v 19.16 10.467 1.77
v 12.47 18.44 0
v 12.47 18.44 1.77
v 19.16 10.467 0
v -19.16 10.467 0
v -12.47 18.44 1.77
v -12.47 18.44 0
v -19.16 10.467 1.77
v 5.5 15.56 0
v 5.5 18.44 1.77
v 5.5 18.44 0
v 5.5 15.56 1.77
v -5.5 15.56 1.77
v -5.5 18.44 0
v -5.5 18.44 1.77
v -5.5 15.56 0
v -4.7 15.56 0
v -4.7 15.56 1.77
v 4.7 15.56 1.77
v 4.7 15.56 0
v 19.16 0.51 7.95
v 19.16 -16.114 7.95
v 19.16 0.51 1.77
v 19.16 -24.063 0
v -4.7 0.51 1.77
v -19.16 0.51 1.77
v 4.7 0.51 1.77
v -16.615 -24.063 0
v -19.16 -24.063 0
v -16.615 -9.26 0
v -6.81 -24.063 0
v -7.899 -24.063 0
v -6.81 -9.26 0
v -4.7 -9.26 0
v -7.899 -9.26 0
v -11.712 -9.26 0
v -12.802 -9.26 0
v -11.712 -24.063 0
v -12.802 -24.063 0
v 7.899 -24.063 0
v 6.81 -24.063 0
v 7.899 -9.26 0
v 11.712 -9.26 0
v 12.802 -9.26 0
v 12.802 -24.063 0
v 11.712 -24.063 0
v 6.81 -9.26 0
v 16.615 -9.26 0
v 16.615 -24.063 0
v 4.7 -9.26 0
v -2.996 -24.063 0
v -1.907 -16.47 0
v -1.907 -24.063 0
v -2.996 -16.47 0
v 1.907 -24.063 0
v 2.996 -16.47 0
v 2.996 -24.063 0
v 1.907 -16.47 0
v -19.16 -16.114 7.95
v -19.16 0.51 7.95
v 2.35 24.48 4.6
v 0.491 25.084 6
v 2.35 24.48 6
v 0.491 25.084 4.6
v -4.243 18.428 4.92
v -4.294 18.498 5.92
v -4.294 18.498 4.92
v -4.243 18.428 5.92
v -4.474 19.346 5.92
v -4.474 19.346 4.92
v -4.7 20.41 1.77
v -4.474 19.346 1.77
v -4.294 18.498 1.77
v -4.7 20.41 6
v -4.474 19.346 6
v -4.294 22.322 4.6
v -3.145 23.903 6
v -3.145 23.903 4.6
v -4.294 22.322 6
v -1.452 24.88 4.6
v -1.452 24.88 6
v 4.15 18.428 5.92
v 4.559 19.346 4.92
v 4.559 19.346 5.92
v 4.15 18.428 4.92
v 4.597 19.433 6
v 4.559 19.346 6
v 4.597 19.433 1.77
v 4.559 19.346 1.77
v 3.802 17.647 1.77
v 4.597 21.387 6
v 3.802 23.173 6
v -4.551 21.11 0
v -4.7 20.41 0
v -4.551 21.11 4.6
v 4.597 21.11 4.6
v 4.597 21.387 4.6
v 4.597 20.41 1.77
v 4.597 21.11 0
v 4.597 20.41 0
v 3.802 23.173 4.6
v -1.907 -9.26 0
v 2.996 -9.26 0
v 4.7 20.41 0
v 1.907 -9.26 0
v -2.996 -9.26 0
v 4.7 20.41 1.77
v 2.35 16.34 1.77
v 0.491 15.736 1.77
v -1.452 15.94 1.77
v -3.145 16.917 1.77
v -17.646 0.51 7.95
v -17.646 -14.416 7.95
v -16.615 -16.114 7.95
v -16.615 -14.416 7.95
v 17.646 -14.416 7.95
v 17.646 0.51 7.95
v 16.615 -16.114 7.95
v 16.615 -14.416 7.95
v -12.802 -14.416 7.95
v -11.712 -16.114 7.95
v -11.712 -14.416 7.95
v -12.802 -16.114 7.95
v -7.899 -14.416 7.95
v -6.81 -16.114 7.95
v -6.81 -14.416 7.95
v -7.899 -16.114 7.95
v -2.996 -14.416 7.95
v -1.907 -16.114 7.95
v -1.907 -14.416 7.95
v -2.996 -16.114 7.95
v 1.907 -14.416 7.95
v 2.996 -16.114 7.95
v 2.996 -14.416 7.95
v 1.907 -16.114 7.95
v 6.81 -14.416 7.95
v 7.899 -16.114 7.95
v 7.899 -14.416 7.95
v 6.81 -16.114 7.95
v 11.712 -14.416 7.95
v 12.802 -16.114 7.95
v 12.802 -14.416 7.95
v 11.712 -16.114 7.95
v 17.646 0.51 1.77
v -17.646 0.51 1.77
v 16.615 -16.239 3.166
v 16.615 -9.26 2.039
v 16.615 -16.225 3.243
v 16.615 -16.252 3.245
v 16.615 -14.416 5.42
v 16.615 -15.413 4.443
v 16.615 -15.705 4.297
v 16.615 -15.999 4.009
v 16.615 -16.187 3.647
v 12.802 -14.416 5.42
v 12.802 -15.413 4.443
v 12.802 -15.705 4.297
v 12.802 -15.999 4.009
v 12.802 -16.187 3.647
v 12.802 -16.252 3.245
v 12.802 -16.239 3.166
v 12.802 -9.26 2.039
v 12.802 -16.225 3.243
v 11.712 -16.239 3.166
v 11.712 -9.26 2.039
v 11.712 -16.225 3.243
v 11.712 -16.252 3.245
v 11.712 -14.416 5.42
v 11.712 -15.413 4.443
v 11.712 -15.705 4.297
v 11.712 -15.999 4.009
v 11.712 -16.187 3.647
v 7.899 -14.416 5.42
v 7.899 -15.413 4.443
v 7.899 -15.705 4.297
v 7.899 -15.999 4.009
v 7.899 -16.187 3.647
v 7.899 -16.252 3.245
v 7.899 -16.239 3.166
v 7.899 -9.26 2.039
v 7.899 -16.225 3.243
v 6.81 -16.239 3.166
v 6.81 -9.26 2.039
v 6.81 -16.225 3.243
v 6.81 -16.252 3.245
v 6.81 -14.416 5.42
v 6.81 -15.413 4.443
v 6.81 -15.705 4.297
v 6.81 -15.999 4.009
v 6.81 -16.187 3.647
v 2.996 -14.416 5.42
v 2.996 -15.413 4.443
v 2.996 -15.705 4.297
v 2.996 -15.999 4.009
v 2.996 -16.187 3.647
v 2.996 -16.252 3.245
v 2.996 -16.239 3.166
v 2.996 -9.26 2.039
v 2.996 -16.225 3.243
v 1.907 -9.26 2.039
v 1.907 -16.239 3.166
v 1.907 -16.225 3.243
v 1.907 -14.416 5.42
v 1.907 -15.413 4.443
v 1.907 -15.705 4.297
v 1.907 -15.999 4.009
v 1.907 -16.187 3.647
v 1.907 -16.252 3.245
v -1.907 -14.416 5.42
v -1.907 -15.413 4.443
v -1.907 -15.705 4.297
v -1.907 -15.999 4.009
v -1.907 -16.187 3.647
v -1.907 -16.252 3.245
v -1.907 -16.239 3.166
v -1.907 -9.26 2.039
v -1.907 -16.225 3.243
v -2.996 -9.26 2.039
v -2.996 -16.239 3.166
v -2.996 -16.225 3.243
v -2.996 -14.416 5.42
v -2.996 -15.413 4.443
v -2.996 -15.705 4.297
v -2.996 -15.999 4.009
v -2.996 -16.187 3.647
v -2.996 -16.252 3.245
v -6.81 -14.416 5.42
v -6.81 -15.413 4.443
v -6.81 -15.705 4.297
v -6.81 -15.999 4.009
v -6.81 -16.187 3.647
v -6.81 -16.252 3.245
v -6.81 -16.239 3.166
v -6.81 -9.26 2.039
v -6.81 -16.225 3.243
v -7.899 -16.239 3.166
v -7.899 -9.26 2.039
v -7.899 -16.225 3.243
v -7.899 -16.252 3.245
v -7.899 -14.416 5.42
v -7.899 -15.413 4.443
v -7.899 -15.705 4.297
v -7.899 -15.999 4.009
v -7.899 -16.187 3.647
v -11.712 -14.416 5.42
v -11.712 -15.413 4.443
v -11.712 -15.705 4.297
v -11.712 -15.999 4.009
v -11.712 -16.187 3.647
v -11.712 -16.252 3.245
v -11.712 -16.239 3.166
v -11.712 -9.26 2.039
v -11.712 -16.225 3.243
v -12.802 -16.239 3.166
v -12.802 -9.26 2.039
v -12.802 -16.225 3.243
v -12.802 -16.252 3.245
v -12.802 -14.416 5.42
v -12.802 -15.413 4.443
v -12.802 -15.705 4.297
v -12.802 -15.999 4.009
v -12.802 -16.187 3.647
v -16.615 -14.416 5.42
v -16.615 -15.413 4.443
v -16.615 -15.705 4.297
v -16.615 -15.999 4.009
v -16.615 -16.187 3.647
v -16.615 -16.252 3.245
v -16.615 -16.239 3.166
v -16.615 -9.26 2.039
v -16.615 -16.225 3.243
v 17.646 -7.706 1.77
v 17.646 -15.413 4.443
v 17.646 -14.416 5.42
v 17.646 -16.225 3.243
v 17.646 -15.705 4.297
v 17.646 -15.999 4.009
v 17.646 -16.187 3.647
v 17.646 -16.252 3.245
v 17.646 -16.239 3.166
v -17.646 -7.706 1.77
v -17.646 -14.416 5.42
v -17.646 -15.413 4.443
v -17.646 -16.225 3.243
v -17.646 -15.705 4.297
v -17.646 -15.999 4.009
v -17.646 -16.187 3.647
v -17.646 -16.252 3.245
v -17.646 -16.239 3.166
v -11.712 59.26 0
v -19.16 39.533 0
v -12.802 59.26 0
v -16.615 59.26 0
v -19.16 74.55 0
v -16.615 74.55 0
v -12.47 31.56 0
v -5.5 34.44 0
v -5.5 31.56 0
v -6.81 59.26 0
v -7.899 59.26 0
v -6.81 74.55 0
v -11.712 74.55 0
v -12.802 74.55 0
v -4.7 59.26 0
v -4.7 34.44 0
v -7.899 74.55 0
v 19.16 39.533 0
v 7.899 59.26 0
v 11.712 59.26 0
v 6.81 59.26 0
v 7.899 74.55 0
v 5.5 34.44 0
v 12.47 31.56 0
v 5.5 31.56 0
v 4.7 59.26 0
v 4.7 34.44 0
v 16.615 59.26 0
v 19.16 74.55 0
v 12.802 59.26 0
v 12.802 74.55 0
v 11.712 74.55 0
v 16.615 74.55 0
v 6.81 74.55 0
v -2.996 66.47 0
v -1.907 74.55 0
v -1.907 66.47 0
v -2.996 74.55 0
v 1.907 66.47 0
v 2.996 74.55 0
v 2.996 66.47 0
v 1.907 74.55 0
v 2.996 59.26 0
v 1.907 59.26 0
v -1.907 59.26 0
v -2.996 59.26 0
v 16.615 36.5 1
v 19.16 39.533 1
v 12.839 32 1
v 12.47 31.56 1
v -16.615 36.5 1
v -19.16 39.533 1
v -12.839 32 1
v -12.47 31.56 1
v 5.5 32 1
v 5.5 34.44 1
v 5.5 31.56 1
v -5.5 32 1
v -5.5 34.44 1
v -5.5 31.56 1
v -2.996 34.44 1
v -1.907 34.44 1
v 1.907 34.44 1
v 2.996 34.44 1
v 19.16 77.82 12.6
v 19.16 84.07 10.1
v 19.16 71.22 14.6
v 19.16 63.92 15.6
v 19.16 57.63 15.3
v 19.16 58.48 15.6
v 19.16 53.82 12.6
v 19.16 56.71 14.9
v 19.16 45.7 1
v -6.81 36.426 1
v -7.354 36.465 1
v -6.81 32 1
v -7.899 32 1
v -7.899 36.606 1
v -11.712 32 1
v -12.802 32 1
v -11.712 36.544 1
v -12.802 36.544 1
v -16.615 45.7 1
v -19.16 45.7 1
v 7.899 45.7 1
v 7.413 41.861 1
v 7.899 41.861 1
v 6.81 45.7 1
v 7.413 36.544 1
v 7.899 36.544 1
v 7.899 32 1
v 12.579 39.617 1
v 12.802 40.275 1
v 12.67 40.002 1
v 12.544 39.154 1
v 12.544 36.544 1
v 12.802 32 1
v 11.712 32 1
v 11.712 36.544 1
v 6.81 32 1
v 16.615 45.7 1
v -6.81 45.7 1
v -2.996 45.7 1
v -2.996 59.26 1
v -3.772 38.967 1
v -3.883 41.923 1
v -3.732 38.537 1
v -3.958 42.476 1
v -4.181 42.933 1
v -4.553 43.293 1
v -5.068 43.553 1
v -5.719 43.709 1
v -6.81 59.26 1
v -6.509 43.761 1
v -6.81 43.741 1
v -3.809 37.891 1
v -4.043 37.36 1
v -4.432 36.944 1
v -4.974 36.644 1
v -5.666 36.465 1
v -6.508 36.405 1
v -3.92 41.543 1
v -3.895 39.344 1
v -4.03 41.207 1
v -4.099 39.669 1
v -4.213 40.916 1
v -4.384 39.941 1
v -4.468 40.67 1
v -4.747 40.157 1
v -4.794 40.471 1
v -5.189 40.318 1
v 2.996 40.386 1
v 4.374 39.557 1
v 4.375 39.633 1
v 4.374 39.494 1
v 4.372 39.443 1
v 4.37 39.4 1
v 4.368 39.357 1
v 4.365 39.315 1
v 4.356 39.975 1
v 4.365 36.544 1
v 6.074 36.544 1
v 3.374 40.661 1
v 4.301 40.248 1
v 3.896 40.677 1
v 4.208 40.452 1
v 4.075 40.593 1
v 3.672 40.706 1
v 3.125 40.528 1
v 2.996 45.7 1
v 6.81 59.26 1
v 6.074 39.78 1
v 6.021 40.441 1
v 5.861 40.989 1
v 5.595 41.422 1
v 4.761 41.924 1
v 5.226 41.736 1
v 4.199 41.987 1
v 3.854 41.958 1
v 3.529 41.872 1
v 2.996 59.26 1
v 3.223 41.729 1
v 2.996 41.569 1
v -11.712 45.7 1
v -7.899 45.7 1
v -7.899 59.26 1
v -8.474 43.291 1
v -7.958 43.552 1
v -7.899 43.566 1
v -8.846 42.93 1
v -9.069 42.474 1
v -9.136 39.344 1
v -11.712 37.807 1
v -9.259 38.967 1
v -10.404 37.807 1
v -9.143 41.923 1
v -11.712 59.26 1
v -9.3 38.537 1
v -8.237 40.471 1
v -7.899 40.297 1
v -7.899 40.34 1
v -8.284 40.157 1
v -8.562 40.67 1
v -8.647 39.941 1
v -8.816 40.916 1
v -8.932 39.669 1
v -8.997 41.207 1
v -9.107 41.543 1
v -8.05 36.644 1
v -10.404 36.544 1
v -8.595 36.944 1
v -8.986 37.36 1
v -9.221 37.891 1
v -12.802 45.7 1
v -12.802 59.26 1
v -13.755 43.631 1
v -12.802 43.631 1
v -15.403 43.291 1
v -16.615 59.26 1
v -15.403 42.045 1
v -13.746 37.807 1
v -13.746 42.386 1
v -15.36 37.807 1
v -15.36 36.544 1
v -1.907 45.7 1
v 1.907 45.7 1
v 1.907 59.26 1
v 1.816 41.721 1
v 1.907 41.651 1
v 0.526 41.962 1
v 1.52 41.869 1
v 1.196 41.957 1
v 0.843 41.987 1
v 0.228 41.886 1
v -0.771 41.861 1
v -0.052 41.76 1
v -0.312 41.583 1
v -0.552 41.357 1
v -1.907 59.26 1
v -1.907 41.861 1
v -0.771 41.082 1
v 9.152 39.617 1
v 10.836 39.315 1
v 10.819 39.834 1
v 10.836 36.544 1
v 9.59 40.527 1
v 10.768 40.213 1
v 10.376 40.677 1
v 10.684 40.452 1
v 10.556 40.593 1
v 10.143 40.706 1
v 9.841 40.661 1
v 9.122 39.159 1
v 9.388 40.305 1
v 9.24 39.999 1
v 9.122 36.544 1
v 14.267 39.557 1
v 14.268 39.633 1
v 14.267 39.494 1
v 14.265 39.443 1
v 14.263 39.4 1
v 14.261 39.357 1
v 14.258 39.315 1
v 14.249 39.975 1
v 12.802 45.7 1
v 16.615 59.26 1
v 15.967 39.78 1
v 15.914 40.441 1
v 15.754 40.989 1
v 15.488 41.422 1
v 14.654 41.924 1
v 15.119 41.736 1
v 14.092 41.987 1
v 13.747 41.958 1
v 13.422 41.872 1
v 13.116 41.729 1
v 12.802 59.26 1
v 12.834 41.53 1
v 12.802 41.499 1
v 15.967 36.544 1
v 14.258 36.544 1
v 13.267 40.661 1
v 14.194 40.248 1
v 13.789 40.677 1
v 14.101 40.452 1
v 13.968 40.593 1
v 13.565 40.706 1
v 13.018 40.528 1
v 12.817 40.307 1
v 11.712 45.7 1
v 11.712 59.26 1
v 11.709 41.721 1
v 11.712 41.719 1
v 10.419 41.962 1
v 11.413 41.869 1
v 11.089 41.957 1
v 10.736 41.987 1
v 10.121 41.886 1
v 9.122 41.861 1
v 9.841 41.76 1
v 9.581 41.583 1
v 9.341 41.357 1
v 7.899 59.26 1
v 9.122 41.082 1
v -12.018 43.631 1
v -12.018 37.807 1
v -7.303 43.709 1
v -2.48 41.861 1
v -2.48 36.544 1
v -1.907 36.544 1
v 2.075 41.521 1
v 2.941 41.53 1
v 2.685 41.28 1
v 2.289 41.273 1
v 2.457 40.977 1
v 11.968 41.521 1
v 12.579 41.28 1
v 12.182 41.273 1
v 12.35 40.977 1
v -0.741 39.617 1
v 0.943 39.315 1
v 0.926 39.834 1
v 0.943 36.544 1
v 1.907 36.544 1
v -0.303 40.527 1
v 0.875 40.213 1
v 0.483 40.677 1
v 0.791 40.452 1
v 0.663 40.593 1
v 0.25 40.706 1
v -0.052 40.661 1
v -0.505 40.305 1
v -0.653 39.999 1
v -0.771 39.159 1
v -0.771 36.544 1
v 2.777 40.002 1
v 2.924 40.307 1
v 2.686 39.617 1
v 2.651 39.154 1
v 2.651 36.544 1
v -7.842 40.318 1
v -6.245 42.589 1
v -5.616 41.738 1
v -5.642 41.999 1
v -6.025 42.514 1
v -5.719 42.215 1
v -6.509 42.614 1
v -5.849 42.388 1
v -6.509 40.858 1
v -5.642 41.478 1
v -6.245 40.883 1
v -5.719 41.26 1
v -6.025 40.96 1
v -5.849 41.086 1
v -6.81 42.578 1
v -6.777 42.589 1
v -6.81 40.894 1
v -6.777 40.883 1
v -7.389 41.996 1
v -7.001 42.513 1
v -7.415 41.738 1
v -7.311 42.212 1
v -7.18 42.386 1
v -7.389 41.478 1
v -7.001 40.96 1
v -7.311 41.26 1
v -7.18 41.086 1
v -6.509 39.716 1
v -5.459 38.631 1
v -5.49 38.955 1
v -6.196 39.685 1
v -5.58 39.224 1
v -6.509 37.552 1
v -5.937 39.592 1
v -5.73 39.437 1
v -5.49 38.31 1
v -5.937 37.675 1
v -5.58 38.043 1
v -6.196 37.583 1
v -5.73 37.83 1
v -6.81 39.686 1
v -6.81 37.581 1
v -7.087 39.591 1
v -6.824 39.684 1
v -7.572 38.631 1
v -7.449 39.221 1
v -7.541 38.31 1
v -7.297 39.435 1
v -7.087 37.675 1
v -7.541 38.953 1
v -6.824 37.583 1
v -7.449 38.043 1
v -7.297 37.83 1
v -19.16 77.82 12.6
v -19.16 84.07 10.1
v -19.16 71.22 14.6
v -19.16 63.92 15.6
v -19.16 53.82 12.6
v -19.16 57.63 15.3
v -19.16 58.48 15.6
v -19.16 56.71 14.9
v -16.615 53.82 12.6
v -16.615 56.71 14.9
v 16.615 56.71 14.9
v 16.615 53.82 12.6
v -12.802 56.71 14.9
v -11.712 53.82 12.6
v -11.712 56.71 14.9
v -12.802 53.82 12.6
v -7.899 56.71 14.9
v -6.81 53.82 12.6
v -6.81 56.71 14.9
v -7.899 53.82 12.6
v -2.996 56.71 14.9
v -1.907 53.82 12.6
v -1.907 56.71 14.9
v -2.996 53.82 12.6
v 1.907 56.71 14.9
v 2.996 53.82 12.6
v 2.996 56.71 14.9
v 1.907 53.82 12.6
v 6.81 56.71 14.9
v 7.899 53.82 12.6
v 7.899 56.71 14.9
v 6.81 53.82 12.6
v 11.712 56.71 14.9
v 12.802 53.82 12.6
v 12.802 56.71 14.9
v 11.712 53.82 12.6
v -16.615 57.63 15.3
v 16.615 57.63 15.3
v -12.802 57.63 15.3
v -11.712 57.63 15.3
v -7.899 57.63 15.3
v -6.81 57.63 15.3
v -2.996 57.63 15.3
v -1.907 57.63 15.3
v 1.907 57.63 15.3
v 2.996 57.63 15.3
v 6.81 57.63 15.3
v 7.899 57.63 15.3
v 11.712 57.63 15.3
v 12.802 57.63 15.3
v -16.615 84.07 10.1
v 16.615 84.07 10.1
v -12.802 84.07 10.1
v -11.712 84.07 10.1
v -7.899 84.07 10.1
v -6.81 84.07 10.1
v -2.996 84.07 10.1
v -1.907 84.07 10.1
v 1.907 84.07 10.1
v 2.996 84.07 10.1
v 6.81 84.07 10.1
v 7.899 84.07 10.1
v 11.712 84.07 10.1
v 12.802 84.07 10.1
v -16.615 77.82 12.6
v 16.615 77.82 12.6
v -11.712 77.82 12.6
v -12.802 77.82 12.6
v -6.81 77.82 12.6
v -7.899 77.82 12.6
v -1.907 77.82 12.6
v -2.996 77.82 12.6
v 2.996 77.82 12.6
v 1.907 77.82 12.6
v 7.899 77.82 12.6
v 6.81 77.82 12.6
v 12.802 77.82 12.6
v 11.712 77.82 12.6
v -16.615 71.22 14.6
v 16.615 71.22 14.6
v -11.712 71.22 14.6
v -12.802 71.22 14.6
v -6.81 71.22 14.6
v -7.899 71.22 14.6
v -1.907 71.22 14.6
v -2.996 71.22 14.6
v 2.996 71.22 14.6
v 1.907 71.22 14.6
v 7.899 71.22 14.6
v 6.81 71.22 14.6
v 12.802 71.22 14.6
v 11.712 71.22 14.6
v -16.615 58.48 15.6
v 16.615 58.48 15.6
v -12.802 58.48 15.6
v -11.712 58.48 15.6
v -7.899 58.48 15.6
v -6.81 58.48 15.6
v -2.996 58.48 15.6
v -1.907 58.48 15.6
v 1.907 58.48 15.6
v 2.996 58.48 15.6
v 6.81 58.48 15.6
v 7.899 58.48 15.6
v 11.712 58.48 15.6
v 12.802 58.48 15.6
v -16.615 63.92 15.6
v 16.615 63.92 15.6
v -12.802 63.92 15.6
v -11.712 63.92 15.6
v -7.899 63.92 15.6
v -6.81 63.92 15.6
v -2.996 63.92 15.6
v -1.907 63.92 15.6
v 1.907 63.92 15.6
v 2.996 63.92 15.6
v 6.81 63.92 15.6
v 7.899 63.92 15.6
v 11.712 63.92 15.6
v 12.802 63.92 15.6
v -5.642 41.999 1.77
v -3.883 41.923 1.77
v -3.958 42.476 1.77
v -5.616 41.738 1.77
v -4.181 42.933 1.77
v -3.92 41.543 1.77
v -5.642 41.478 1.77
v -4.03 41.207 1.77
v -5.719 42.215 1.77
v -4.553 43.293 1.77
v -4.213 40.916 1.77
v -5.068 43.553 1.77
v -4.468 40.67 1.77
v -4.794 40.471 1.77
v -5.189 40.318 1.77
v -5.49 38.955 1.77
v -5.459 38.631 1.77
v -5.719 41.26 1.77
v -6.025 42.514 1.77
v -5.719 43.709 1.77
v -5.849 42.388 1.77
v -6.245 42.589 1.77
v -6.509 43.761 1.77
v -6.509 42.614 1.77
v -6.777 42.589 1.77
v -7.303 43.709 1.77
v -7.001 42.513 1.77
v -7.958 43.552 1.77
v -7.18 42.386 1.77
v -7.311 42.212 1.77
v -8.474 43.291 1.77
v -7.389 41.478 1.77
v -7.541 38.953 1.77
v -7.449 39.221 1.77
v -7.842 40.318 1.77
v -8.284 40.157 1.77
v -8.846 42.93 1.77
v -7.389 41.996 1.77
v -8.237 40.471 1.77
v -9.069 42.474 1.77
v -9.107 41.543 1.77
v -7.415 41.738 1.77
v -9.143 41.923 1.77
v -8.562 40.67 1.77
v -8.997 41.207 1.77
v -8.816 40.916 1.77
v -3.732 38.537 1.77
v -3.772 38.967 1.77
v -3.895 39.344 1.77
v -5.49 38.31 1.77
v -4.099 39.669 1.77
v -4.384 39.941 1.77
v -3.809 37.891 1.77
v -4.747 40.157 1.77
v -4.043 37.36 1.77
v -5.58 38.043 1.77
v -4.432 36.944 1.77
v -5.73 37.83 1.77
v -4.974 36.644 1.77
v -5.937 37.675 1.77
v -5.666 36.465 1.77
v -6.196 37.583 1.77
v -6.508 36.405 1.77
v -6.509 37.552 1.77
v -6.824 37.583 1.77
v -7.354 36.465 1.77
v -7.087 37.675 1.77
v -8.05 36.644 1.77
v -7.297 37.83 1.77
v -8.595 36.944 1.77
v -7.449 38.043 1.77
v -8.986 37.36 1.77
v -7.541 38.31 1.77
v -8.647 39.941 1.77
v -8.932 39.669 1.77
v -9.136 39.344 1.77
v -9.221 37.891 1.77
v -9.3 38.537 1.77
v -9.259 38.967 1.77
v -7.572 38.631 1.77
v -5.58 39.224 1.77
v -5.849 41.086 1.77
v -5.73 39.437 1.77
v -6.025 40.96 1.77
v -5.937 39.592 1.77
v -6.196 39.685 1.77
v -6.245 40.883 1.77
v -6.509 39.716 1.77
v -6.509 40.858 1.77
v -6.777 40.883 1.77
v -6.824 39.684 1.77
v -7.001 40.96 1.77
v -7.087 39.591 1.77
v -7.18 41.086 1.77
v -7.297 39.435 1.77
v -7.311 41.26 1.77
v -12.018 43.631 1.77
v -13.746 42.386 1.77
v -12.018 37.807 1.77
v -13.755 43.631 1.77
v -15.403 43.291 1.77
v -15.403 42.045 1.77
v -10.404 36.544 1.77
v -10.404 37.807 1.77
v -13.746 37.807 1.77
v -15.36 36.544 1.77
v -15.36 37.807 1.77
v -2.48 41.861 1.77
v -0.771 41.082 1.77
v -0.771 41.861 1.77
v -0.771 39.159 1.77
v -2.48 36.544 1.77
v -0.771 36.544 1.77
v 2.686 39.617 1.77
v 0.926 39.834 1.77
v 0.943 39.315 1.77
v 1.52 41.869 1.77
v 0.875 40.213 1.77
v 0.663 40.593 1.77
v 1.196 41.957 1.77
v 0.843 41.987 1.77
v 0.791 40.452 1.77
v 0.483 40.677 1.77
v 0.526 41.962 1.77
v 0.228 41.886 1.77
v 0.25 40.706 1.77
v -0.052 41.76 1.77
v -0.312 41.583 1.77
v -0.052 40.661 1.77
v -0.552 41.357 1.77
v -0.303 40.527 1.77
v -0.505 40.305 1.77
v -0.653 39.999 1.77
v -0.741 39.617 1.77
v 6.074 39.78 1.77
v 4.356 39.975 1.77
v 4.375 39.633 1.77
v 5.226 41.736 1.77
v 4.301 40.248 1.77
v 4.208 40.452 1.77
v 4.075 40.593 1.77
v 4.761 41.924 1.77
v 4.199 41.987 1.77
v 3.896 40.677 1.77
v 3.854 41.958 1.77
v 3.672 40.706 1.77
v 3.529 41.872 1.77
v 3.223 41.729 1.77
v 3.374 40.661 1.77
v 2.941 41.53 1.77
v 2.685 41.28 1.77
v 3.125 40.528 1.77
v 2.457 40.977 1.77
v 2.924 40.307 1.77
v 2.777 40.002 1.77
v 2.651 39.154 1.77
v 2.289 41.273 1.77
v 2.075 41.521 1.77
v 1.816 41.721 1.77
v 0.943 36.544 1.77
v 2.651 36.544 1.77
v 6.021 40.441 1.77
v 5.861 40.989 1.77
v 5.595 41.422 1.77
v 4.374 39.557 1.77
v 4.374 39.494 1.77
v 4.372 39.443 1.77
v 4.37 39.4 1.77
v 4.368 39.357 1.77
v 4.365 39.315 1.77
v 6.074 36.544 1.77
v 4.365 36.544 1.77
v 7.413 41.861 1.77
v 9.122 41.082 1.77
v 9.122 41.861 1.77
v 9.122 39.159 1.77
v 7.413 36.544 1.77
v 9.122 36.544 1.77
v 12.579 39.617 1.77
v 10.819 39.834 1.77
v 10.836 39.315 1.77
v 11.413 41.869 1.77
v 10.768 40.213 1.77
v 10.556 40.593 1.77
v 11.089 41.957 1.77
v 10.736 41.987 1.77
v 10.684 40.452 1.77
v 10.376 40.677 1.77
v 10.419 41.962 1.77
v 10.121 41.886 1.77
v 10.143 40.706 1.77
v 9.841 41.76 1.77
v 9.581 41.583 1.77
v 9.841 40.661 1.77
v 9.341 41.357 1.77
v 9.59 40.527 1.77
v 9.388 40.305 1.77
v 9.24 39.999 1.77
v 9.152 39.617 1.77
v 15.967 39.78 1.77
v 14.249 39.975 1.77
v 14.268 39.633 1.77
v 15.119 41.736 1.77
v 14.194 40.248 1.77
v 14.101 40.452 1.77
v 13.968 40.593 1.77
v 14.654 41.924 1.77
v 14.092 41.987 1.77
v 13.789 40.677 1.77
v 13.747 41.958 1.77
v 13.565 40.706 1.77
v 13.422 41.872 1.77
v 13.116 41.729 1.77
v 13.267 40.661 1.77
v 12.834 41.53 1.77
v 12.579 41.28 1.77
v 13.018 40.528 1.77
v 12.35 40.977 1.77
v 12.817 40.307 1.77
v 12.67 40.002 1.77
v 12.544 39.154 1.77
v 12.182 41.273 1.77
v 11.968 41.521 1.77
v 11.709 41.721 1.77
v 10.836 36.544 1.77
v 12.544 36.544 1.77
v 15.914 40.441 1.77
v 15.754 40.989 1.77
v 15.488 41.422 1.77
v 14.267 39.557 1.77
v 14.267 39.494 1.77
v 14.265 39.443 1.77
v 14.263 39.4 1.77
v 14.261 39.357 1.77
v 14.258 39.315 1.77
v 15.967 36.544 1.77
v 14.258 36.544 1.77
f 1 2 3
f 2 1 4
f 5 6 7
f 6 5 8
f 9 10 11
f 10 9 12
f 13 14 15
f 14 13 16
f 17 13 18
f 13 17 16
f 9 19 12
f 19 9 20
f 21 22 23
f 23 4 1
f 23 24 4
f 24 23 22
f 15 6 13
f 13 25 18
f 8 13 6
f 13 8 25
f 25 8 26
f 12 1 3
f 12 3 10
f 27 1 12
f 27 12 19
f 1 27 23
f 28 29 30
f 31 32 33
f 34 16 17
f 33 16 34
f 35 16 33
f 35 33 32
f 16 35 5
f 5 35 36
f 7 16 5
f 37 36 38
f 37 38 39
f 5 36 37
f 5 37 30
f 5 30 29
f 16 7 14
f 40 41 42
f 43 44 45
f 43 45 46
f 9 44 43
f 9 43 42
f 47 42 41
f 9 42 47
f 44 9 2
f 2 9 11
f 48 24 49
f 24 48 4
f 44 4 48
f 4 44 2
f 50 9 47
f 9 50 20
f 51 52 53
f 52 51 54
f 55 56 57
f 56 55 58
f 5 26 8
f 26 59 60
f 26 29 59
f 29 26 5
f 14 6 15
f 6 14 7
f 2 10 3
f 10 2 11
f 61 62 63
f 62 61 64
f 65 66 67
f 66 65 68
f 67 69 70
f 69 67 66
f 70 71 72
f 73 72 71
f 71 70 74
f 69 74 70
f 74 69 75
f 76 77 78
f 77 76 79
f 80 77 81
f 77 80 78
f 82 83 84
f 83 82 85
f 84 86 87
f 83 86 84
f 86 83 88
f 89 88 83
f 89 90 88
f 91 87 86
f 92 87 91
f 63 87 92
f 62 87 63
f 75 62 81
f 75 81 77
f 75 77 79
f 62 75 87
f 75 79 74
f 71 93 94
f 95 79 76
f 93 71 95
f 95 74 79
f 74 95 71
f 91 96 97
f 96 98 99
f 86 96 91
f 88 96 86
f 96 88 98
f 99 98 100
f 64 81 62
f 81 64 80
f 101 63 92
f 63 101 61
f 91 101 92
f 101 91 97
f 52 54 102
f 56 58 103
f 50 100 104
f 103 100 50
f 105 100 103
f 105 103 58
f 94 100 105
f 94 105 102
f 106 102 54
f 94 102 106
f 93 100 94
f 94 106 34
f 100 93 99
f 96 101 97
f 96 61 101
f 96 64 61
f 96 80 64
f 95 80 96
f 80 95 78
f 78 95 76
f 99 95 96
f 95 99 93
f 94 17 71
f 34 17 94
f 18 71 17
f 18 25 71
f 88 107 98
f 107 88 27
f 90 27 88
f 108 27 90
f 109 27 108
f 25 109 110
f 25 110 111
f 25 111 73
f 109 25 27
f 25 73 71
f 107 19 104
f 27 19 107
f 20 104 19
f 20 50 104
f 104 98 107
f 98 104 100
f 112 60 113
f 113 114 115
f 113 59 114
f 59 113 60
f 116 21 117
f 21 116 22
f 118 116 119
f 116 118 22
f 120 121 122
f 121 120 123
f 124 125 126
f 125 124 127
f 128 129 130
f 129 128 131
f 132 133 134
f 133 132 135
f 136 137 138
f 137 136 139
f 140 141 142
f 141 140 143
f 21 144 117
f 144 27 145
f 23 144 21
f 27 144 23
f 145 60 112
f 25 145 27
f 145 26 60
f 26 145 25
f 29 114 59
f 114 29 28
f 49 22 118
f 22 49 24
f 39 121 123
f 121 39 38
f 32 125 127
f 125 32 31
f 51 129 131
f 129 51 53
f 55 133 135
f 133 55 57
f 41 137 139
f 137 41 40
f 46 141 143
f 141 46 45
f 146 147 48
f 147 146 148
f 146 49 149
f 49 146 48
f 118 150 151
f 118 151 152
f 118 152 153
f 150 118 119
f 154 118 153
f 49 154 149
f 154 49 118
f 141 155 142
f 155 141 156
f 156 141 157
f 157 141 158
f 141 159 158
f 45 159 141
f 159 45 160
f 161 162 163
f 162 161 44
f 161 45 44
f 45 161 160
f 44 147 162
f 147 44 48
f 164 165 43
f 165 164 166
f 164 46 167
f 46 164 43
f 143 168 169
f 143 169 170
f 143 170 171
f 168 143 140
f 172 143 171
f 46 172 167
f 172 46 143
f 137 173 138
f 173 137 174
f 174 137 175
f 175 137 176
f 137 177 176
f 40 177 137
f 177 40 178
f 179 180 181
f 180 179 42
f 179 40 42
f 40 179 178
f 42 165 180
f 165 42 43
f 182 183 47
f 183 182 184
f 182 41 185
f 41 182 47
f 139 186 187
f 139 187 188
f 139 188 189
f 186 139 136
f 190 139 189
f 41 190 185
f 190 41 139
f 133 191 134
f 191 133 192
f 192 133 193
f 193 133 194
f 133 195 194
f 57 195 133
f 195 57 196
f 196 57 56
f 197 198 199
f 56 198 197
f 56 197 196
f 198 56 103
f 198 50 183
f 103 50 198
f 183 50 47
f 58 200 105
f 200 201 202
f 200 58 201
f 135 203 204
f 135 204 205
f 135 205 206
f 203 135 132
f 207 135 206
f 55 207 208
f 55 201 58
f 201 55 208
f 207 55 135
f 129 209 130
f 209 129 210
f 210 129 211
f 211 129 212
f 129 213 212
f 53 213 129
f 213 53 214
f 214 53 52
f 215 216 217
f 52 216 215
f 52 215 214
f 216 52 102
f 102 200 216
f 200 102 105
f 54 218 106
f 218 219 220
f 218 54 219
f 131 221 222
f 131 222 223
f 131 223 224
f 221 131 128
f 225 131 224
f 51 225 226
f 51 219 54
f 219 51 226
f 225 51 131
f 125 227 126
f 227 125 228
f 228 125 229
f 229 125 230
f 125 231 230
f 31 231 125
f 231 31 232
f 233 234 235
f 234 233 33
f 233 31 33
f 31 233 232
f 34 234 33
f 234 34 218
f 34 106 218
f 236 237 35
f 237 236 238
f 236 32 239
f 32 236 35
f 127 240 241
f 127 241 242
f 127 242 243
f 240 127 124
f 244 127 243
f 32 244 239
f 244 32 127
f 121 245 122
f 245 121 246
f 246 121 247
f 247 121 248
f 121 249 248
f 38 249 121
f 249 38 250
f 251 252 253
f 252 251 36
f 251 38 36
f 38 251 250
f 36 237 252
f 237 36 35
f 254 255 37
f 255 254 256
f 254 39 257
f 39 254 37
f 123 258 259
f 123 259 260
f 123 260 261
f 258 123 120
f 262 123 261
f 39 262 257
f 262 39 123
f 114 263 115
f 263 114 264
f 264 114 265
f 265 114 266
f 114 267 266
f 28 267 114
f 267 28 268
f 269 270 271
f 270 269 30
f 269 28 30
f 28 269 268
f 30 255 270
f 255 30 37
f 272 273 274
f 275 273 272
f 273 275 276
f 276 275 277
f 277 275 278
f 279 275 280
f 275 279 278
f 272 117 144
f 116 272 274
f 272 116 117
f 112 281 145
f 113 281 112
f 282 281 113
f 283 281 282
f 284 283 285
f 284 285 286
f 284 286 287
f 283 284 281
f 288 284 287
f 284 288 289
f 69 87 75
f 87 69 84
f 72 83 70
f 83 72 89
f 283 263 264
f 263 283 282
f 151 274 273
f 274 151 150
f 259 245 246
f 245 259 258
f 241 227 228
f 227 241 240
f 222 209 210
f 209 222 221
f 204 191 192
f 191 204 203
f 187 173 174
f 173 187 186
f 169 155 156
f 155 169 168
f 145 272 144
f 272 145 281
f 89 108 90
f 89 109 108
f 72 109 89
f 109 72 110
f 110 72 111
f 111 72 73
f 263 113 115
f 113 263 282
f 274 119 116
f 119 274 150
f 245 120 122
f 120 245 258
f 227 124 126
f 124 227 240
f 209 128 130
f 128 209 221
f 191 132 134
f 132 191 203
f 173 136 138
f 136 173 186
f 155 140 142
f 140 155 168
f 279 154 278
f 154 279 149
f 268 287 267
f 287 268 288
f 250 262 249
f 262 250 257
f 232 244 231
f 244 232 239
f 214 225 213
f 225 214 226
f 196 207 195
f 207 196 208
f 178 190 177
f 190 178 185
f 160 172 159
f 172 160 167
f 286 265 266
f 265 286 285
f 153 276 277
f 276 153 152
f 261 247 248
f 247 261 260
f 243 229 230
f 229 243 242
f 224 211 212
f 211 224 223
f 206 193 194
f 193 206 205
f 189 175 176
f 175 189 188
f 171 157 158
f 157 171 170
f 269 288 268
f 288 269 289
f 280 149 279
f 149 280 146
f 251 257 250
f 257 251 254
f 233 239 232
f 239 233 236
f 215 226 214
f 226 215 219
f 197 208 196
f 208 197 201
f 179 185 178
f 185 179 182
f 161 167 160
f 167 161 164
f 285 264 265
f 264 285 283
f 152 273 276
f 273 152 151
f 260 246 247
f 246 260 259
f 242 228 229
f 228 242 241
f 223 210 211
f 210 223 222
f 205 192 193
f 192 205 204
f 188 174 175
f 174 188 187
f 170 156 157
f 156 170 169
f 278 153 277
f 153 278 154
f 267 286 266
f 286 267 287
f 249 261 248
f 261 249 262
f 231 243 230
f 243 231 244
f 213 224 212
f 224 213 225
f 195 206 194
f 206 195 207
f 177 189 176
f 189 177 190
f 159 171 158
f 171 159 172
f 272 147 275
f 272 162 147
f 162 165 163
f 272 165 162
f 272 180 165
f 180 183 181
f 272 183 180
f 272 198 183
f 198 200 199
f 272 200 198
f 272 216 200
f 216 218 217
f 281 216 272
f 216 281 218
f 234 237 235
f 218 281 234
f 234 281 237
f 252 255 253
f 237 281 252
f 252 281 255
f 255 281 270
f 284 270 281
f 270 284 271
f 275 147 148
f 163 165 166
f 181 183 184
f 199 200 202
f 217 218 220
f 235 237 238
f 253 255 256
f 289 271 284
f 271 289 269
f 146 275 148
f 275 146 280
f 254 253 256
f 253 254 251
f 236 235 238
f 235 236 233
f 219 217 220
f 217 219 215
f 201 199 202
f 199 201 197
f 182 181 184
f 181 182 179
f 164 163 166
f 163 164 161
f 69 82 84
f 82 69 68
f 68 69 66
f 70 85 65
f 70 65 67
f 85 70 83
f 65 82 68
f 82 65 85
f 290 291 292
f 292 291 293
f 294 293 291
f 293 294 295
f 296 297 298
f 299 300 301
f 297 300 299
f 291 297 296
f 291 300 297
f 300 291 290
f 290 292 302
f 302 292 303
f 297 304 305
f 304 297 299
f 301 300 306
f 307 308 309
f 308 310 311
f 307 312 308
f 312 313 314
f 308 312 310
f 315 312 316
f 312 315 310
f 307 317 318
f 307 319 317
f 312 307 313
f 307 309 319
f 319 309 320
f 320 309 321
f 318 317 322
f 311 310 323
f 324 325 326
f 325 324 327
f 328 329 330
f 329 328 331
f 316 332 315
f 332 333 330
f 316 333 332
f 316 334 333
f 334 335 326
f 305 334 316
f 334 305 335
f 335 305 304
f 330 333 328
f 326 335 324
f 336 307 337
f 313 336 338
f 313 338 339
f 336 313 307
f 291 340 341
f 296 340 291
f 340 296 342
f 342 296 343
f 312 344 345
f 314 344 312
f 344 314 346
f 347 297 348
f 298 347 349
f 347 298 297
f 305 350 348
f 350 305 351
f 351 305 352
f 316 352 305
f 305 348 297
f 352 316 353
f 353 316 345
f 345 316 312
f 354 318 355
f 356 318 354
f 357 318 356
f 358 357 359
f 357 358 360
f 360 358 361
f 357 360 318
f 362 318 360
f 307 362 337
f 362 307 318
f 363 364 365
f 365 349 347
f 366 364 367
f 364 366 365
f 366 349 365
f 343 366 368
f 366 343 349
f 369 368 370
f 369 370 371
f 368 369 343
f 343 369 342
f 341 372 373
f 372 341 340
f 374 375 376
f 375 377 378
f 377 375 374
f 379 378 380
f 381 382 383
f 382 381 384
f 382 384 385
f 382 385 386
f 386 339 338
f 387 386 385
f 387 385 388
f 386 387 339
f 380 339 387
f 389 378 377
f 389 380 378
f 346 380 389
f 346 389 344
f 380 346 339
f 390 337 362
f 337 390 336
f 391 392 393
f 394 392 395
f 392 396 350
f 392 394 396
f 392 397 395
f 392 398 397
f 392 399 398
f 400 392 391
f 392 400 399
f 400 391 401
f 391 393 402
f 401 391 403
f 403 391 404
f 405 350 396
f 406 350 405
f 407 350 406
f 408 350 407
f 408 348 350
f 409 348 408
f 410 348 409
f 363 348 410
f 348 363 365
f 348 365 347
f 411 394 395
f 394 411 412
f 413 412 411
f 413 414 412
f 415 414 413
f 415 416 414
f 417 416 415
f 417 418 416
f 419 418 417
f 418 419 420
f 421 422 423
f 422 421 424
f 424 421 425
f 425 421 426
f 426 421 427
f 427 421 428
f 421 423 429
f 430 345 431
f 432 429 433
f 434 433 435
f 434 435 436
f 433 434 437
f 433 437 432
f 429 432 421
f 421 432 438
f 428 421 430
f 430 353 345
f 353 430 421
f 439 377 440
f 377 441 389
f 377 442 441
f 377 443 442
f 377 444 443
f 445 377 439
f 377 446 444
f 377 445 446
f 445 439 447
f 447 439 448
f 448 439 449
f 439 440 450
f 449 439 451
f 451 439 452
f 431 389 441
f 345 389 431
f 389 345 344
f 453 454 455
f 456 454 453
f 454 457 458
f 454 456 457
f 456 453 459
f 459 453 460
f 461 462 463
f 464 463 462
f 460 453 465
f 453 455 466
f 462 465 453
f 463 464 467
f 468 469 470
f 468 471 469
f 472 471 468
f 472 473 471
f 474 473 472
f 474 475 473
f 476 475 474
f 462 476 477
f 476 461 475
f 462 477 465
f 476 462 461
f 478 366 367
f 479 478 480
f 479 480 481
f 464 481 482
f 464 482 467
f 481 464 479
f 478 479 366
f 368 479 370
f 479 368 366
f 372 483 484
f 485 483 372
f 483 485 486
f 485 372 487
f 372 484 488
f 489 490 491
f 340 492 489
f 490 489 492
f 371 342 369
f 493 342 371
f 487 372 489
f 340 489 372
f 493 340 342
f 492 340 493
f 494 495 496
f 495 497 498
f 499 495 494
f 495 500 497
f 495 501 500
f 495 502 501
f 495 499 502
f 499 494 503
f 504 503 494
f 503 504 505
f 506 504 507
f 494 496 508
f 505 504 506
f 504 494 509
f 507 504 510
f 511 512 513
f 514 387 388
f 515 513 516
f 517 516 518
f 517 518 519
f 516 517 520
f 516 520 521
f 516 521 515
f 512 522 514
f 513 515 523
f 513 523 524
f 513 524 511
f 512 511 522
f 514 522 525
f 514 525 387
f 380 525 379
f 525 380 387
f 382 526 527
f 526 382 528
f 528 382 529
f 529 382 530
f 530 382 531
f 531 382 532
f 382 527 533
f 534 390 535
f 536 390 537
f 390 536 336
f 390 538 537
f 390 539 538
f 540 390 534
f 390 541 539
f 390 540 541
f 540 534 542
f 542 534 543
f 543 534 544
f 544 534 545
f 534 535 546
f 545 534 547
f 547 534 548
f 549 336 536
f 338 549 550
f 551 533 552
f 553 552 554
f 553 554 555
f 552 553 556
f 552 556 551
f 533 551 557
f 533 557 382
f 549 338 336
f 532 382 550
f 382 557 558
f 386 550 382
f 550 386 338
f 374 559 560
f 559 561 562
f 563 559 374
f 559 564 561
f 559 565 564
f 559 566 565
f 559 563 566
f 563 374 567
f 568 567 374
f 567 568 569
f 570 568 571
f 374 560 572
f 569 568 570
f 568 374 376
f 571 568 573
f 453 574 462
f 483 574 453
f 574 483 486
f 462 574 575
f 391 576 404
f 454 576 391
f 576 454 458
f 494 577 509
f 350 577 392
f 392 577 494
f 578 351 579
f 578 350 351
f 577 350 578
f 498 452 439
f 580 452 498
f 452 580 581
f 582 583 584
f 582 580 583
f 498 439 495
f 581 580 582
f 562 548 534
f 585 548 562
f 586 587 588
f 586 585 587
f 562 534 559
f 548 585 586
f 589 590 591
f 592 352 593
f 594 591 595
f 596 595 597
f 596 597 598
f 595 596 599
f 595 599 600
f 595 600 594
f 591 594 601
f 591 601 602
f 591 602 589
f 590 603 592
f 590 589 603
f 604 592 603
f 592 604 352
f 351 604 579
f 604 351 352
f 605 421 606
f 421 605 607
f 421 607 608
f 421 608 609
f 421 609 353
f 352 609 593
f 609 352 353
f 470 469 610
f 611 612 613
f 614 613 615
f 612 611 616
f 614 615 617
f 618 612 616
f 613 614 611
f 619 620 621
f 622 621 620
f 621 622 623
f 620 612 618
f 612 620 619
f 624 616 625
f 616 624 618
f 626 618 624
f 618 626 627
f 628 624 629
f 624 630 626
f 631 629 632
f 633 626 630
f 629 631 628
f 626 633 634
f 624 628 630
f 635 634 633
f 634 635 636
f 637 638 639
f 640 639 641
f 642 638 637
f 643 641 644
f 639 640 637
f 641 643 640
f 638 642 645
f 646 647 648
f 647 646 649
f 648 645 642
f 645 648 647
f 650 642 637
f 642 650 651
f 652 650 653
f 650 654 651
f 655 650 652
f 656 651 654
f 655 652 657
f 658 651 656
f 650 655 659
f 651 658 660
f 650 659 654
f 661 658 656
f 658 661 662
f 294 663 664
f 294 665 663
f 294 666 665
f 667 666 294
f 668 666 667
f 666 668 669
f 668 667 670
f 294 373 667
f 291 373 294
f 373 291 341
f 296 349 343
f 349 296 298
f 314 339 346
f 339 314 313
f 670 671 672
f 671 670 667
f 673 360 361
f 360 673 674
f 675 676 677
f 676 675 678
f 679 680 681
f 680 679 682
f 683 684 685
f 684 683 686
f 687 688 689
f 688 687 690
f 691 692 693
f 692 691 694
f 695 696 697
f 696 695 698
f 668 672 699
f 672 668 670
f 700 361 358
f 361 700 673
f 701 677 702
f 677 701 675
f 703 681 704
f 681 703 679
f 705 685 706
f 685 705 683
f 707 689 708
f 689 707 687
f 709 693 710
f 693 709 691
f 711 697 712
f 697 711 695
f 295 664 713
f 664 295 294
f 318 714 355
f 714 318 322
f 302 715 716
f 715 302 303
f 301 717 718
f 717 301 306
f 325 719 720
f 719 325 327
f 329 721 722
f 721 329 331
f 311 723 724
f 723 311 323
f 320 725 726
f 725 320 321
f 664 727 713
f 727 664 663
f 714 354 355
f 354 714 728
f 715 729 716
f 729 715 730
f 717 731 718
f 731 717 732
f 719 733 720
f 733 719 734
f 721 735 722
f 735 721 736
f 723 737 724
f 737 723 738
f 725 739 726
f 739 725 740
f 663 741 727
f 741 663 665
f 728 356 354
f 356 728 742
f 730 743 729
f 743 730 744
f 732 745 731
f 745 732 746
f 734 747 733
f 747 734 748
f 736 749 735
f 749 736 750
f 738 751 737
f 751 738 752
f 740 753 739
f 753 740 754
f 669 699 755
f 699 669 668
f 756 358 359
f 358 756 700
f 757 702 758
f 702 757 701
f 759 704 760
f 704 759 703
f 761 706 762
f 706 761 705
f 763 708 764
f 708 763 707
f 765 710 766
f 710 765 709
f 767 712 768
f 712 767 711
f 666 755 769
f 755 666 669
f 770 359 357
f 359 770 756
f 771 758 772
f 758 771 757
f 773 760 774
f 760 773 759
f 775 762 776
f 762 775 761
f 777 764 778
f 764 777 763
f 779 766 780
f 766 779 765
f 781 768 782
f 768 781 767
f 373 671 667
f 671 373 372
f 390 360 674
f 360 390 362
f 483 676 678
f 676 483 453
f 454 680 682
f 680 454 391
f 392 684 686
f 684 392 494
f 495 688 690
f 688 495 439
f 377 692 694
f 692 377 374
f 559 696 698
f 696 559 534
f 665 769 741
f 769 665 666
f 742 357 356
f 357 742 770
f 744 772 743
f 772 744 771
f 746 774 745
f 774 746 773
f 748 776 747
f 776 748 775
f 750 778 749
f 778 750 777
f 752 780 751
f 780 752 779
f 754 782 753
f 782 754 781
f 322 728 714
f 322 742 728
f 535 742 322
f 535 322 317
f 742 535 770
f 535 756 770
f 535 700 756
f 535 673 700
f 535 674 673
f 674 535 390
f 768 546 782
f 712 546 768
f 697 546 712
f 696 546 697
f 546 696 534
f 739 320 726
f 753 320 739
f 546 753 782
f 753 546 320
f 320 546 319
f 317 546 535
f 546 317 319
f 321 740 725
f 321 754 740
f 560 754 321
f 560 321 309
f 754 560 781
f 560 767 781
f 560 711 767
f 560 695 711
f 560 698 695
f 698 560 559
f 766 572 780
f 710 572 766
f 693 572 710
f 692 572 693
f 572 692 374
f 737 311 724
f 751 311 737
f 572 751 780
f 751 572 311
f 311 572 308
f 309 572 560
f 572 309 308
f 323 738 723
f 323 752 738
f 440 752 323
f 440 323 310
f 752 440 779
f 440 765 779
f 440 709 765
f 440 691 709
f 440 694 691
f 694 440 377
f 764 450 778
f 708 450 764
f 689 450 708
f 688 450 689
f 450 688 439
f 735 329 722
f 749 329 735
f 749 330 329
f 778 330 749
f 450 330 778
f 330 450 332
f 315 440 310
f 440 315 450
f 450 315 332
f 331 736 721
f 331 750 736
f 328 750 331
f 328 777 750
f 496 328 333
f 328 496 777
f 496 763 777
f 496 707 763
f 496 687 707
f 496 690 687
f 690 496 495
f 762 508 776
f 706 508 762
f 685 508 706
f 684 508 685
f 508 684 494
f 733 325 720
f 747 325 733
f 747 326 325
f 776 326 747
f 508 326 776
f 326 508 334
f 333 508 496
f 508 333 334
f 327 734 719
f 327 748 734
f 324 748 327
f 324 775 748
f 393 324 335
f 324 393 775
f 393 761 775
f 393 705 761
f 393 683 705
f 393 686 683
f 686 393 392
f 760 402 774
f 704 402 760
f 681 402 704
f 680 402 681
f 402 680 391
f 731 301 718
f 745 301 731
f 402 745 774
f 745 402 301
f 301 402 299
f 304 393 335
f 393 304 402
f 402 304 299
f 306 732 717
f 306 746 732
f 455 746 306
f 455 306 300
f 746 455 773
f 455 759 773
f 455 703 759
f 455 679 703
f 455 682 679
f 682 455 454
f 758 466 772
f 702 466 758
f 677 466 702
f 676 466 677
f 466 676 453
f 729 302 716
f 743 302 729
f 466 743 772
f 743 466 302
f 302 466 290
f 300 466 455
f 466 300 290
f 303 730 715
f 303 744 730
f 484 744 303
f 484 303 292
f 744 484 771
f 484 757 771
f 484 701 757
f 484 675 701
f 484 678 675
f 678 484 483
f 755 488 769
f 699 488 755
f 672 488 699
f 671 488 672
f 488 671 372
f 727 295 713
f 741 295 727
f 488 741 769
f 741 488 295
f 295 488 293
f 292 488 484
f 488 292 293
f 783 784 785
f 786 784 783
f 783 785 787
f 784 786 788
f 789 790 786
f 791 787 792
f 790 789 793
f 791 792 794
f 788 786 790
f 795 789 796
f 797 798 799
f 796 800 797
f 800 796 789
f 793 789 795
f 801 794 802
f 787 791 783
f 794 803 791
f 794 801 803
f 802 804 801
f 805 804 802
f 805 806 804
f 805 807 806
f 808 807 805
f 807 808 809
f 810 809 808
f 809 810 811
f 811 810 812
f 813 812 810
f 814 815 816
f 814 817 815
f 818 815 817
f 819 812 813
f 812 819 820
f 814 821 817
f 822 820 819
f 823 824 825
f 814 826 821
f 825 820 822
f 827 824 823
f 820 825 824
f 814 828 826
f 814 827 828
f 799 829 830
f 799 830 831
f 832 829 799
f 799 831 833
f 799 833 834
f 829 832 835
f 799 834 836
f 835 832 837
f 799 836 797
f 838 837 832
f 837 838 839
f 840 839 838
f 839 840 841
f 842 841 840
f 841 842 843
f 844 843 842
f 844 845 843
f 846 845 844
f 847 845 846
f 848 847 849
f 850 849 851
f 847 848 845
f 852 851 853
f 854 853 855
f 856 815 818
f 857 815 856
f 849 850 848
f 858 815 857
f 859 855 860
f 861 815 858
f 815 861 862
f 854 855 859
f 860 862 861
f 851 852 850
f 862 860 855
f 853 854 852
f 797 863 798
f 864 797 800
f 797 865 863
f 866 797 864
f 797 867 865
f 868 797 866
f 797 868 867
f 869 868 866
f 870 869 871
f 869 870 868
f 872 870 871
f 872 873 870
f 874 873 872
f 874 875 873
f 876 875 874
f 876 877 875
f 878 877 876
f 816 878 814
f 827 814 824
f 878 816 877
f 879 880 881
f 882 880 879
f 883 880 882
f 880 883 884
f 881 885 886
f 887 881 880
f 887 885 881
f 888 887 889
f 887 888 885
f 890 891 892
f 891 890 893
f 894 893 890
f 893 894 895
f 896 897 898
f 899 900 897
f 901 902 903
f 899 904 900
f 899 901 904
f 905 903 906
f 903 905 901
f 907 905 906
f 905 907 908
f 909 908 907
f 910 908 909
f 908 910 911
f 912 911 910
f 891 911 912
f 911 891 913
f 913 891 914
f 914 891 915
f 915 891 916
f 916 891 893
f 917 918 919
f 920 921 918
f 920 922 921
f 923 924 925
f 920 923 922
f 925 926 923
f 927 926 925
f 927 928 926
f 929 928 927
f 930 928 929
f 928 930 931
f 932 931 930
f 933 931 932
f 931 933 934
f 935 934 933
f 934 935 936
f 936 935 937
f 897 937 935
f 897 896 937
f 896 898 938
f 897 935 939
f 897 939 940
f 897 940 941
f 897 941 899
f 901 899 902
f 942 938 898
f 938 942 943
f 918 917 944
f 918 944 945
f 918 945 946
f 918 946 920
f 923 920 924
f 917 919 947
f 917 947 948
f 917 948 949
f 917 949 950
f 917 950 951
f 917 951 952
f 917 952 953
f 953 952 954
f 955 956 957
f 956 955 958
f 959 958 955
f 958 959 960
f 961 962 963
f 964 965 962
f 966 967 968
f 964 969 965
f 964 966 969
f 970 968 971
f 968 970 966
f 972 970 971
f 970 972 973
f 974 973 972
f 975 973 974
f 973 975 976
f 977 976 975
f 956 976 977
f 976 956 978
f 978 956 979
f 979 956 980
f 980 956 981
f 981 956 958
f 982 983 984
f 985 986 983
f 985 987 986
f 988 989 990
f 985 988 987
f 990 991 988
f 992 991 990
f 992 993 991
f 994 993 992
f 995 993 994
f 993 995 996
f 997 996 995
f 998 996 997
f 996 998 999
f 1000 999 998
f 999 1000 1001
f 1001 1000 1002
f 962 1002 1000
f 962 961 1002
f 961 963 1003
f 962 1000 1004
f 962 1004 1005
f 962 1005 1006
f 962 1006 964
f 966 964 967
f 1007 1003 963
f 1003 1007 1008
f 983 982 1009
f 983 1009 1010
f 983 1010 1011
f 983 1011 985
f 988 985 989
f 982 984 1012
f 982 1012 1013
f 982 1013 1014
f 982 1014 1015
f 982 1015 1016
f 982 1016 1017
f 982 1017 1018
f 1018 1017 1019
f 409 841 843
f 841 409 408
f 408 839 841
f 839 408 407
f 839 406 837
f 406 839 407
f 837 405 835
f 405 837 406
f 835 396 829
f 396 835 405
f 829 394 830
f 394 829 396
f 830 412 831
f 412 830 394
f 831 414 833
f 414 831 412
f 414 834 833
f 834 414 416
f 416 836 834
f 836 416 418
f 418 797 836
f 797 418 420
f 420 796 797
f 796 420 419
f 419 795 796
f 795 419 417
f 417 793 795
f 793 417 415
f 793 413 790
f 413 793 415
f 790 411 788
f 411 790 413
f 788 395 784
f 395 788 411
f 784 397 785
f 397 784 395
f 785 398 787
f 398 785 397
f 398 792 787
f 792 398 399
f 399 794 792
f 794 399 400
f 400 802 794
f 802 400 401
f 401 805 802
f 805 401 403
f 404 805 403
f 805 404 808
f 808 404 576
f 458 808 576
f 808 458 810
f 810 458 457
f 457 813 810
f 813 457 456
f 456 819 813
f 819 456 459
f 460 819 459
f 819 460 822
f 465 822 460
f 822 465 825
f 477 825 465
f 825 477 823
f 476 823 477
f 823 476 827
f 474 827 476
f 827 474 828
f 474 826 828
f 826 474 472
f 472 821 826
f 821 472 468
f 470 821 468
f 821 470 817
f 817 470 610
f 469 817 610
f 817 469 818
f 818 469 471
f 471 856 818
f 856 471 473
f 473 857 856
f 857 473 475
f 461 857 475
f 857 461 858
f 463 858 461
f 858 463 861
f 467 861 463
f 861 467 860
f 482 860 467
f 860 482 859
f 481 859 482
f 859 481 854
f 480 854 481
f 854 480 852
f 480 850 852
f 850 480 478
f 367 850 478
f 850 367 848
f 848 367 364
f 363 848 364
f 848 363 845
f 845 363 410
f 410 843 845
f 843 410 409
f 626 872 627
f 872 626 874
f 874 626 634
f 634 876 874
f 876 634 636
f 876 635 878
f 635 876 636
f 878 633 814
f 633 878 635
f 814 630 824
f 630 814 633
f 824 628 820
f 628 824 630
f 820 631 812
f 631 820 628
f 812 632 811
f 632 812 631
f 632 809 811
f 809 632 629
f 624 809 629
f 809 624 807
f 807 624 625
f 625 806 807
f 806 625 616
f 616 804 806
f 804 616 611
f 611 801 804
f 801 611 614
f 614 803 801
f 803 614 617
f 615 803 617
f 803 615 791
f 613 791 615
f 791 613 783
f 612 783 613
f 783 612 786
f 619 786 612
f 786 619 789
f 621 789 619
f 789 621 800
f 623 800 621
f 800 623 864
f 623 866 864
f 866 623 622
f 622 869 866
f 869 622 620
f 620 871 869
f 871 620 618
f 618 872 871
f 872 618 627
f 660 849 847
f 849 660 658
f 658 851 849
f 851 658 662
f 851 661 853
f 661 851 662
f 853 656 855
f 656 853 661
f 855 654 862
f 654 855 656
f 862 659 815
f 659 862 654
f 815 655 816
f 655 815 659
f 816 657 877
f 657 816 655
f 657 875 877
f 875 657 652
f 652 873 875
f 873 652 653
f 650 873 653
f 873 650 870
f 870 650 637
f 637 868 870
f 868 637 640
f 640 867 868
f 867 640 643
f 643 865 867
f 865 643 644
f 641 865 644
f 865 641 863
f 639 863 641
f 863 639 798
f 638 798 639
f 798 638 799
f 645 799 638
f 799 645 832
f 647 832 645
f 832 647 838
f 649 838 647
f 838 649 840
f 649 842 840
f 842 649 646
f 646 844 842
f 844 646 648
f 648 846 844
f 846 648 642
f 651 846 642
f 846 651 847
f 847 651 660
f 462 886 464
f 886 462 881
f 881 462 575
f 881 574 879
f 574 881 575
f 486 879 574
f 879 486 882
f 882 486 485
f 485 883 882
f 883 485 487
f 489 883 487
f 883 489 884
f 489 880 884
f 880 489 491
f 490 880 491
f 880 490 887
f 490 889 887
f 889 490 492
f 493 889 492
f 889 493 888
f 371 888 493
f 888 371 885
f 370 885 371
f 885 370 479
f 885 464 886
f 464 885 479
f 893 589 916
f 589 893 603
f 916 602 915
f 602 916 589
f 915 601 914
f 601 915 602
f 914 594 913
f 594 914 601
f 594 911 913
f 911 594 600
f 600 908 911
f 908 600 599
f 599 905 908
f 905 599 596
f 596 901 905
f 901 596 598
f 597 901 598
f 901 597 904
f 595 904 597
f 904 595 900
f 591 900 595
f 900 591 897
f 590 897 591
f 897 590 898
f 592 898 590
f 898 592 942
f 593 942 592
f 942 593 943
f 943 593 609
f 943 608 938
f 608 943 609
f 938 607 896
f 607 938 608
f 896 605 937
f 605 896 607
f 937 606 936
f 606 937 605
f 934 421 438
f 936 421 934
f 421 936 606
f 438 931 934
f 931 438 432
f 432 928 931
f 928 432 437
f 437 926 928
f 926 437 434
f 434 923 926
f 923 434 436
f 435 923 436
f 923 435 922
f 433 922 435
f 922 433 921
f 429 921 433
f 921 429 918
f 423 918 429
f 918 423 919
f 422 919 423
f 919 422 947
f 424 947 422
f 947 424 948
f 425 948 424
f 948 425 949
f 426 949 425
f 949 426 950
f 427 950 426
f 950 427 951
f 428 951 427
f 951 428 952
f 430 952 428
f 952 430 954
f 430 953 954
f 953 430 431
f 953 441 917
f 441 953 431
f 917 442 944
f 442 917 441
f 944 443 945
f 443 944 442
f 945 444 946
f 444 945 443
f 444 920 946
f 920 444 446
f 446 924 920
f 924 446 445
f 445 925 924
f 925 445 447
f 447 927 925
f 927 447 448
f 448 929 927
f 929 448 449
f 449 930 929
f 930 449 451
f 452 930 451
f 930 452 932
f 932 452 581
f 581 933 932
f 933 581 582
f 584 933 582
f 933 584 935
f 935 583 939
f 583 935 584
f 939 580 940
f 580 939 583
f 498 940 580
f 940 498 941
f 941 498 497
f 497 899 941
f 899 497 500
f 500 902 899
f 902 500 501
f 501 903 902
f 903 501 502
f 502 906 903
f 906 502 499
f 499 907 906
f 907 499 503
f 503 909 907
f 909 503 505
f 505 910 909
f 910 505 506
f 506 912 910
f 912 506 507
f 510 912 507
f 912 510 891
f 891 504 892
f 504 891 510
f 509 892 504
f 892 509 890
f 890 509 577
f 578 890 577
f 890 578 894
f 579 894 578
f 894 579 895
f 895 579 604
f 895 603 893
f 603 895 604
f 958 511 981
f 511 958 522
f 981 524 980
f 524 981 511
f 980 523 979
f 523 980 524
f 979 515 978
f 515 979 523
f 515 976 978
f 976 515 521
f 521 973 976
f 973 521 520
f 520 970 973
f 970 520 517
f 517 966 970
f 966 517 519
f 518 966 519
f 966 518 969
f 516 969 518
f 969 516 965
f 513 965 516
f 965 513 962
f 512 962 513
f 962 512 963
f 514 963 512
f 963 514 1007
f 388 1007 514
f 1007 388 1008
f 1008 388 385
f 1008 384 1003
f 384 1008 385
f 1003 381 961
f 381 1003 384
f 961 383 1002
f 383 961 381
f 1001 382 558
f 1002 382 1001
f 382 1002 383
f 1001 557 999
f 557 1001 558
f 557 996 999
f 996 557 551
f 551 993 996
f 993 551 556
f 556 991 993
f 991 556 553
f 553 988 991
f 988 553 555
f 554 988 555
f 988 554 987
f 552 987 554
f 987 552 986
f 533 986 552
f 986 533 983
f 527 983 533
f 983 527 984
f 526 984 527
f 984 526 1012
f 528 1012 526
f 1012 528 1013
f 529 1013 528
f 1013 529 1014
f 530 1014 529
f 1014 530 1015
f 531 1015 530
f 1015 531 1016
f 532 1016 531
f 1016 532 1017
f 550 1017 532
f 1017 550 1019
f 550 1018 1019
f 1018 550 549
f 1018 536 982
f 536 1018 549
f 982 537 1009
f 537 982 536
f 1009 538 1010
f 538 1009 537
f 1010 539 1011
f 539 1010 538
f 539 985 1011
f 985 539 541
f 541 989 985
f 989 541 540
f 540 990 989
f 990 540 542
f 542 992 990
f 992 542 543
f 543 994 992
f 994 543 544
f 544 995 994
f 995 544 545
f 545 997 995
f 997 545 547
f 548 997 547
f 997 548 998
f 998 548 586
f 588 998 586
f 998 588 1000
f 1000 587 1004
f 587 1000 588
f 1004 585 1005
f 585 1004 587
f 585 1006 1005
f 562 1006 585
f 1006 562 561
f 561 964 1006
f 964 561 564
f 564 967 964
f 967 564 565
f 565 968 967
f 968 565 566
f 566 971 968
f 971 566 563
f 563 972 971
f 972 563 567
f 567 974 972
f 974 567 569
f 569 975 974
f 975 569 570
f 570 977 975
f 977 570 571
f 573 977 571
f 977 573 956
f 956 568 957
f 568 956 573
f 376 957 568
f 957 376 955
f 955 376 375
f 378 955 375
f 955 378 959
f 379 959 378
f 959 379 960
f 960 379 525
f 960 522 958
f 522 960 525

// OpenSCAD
// A parametric guard for the Trym beard trimmer. The largest guard it comes with is 9mm which is
// not enough mms. This lets to have as many mms as you desire.
//
// First OpenSCAD project. Kind of a mess.

// The length to cut the hair in millimeters (measure twice, cut once though)
guard_height = 18;

/* Hidden */

base_width = 38.32;
base_length = 27.70+9.18;
base_thickness = 1.77;

base_notch_width= 11;
base_notch_length = 2.88;

root_width = 26.95;
root_height = 7.95-1.77+base_thickness;

module base_chamfer(dir) {
  translate([dir * (base_width/2), base_length/2, 0])
    rotate(a=dir*40, v=[0,0,1])
    cube([10.25, 10.25*2, base_thickness*2], center=true);
}


// Trym Guard Base
module trym_guard_base() {
  module base_core() {

    difference() {
      cube([base_width, base_length, base_thickness], center=true);
      union() {
        base_chamfer(1);
        base_chamfer(-1);
        translate([0, base_length/2, 0])
          cube([base_notch_width, base_notch_length*2, base_thickness*2], center=true);
      }
    }
  }

  module lock_tab() {
    lock_tab_offset = 1.97;
    lock_tab_width = 9.4;
    riser_length = 1.4;
    riser_height = 6.0;
    latch_sides = 1.25;

    translate([lock_tab_width/2, base_length/2+lock_tab_offset, -base_thickness/2])
      rotate(a=180, v=[0, 0, 1]) {
        cube([lock_tab_width, base_length, base_thickness]);
        difference() {
          translate([lock_tab_width/2, 0, 0]) cylinder(h=riser_height, d=lock_tab_width);
          union() {
            //translate([0, riser_length, base_thickness])
            //  cube([lock_tab_width, lock_tab_width, riser_height*2]);
            translate([0, -lock_tab_width-0.7, 0])
              cube([lock_tab_width, lock_tab_width, riser_height-riser_length]);
          }
        }
      }
  }

  module teeth_guard() {
    difference() {
      translate([0, -base_length/2 + root_width/2 - 8, -base_thickness/2+root_height/2])
        cube([base_width, root_width, root_height], center=true);
      union() {
        translate([0, -base_length/2-2, base_thickness/2+root_height/2+3.5])
          rotate(a=45, v=[1, 0, 0])
          cube([base_width, root_width, root_height], center=true);
      }
    }
  }

  translate([0, 0, base_thickness/2]) {
    difference() {
      union() {
        base_core();
        lock_tab();
        teeth_guard();
      }
      union() {
        for(i=[0:6]) {
          tooth_area_width = base_width-4;
          translate([tooth_area_width/2 - tooth_area_width/7*i - tooth_area_width/7/2, -base_length/2, root_height/2-base_thickness/2]) 
            cube([tooth_area_width/9, 9.18*2, 50], center=true);
        }
      }
    }
  }
}

head_length = 34.6;
head_width = 34.6;
head_thickness = 2.65;
module trym_head() {
  difference() {
    union() {
      translate([0, 1.1/4, 0]) cube([head_width, head_length-1.1/2, head_thickness], center=true);
      difference() {
        translate([0, 0.25, head_thickness/2+1/2])
          cube([head_width, head_length-0.5, 1], center=true);
        translate([-head_width/2, -head_length/2+0.5, head_thickness/2])
          rotate(a=45, v=[1, 0, 0])
          cube([head_width, 3, 3]);
      }
      translate([0, 0.75, head_thickness/2+1+10]) cube([head_width, head_length-1.5, 20], center=true);
      translate([0, -head_length/2 + 1, 0.15]) rotate(a=90, v=[0, 1, 0]) cylinder(d=2.6, h=head_width, center=true, $fn=20);
    }
    union() {
      translate([0, -head_length/2-0.3, 0])
        rotate(a=-10, v=[1, 0, 0])
        translate([-head_width/2, 0, -head_thickness-0.2])
        cube([head_width, 8.47+0.4, 3]);
      notch_depth = 0.9;
      notch_width = 9.5;
      translate([0, head_width/2-notch_depth/2, head_thickness/2+1]) cube([notch_width, notch_depth, 1], center=true);
    }
  }
}

module trym_base() {
  difference() {
    trym_guard_base();
    translate([0, 1.7, base_thickness + head_thickness/2])
      scale([1.02, 1.02, 1]) // wiggle room on the sides
      trym_head();
  }
}

module trym_teeth(height) {
  adjusted_height=height-2.4;
  rotate(a=180, v=[1, 0, 0])
    difference() {
      union() {
        difference() {
          union() {
            guard_base_length = 32;
            translate([0,5,0])
              rotate(a=90, v=[0, 0, 1])
              rotate(a=90, v=[1, 0, 0]) 
              translate([0,0,-base_width/2])
              linear_extrude(height=base_width) {
                // The "0.7" is the skew value; pushed along the y axis
                M = [ [ 1, 0.7, 0],
                  [ 0, 1, 0],
                  [ 0, 0, 1] ] ;
                multmatrix(M)
                  polygon([[0,0],
                      [-guard_base_length+2.45,0],
                      [-guard_base_length,-adjusted_height+5.5],
                      [-guard_base_length*0.75,-adjusted_height+3],
                      [-guard_base_length*0.50,-adjusted_height+1],
                      [-guard_base_length*0.25,-adjusted_height],
                      [-guard_base_length*0.08,-adjusted_height],
                      [-guard_base_length*0.06,-adjusted_height+0.3],
                      [-guard_base_length*0.04,-adjusted_height+0.7],
                      [0,-adjusted_height+3]]);

              }
            translate([0, 0, -1/2]) {
              difference() {
                cube([base_width, base_length, 1], center=true);
                union() {
                  base_chamfer(1);
                  base_chamfer(-1);
                  translate([0, base_length/2, 0])
                    cube([base_notch_width, base_notch_length*2, base_thickness*2], center=true);
                }
              }
            }
          }
          union() {
            for(i=[0:6]) {
              tooth_area_width = base_width-4;
              translate([tooth_area_width/2 - tooth_area_width/7*i - tooth_area_width/7/2, -base_length/2 - (9.18*18/2), root_height/2-base_thickness/2]) 
                cube([tooth_area_width/9, 9.18*20, 100], center=true);
              translate([tooth_area_width/2 - tooth_area_width/7*i - tooth_area_width/7/2, 0, -height/2-1]) 
                cube([tooth_area_width/9, height*2, height], center=true);
            }
          }
        }
        // text
        rotate(a=180, v=[0, 1, 0])
          translate([0, 10, 0])
          linear_extrude(height=base_thickness)
          rotate(a=180, v=[0, 0, 1])
          text(text = str(height, "mm"), font="Impact:style=Bold", size=7, halign="center", valign="center");
      }
      trym_base();
    }
}

trym_base();
translate([0, 50, 0]) trym_teeth(guard_height);
